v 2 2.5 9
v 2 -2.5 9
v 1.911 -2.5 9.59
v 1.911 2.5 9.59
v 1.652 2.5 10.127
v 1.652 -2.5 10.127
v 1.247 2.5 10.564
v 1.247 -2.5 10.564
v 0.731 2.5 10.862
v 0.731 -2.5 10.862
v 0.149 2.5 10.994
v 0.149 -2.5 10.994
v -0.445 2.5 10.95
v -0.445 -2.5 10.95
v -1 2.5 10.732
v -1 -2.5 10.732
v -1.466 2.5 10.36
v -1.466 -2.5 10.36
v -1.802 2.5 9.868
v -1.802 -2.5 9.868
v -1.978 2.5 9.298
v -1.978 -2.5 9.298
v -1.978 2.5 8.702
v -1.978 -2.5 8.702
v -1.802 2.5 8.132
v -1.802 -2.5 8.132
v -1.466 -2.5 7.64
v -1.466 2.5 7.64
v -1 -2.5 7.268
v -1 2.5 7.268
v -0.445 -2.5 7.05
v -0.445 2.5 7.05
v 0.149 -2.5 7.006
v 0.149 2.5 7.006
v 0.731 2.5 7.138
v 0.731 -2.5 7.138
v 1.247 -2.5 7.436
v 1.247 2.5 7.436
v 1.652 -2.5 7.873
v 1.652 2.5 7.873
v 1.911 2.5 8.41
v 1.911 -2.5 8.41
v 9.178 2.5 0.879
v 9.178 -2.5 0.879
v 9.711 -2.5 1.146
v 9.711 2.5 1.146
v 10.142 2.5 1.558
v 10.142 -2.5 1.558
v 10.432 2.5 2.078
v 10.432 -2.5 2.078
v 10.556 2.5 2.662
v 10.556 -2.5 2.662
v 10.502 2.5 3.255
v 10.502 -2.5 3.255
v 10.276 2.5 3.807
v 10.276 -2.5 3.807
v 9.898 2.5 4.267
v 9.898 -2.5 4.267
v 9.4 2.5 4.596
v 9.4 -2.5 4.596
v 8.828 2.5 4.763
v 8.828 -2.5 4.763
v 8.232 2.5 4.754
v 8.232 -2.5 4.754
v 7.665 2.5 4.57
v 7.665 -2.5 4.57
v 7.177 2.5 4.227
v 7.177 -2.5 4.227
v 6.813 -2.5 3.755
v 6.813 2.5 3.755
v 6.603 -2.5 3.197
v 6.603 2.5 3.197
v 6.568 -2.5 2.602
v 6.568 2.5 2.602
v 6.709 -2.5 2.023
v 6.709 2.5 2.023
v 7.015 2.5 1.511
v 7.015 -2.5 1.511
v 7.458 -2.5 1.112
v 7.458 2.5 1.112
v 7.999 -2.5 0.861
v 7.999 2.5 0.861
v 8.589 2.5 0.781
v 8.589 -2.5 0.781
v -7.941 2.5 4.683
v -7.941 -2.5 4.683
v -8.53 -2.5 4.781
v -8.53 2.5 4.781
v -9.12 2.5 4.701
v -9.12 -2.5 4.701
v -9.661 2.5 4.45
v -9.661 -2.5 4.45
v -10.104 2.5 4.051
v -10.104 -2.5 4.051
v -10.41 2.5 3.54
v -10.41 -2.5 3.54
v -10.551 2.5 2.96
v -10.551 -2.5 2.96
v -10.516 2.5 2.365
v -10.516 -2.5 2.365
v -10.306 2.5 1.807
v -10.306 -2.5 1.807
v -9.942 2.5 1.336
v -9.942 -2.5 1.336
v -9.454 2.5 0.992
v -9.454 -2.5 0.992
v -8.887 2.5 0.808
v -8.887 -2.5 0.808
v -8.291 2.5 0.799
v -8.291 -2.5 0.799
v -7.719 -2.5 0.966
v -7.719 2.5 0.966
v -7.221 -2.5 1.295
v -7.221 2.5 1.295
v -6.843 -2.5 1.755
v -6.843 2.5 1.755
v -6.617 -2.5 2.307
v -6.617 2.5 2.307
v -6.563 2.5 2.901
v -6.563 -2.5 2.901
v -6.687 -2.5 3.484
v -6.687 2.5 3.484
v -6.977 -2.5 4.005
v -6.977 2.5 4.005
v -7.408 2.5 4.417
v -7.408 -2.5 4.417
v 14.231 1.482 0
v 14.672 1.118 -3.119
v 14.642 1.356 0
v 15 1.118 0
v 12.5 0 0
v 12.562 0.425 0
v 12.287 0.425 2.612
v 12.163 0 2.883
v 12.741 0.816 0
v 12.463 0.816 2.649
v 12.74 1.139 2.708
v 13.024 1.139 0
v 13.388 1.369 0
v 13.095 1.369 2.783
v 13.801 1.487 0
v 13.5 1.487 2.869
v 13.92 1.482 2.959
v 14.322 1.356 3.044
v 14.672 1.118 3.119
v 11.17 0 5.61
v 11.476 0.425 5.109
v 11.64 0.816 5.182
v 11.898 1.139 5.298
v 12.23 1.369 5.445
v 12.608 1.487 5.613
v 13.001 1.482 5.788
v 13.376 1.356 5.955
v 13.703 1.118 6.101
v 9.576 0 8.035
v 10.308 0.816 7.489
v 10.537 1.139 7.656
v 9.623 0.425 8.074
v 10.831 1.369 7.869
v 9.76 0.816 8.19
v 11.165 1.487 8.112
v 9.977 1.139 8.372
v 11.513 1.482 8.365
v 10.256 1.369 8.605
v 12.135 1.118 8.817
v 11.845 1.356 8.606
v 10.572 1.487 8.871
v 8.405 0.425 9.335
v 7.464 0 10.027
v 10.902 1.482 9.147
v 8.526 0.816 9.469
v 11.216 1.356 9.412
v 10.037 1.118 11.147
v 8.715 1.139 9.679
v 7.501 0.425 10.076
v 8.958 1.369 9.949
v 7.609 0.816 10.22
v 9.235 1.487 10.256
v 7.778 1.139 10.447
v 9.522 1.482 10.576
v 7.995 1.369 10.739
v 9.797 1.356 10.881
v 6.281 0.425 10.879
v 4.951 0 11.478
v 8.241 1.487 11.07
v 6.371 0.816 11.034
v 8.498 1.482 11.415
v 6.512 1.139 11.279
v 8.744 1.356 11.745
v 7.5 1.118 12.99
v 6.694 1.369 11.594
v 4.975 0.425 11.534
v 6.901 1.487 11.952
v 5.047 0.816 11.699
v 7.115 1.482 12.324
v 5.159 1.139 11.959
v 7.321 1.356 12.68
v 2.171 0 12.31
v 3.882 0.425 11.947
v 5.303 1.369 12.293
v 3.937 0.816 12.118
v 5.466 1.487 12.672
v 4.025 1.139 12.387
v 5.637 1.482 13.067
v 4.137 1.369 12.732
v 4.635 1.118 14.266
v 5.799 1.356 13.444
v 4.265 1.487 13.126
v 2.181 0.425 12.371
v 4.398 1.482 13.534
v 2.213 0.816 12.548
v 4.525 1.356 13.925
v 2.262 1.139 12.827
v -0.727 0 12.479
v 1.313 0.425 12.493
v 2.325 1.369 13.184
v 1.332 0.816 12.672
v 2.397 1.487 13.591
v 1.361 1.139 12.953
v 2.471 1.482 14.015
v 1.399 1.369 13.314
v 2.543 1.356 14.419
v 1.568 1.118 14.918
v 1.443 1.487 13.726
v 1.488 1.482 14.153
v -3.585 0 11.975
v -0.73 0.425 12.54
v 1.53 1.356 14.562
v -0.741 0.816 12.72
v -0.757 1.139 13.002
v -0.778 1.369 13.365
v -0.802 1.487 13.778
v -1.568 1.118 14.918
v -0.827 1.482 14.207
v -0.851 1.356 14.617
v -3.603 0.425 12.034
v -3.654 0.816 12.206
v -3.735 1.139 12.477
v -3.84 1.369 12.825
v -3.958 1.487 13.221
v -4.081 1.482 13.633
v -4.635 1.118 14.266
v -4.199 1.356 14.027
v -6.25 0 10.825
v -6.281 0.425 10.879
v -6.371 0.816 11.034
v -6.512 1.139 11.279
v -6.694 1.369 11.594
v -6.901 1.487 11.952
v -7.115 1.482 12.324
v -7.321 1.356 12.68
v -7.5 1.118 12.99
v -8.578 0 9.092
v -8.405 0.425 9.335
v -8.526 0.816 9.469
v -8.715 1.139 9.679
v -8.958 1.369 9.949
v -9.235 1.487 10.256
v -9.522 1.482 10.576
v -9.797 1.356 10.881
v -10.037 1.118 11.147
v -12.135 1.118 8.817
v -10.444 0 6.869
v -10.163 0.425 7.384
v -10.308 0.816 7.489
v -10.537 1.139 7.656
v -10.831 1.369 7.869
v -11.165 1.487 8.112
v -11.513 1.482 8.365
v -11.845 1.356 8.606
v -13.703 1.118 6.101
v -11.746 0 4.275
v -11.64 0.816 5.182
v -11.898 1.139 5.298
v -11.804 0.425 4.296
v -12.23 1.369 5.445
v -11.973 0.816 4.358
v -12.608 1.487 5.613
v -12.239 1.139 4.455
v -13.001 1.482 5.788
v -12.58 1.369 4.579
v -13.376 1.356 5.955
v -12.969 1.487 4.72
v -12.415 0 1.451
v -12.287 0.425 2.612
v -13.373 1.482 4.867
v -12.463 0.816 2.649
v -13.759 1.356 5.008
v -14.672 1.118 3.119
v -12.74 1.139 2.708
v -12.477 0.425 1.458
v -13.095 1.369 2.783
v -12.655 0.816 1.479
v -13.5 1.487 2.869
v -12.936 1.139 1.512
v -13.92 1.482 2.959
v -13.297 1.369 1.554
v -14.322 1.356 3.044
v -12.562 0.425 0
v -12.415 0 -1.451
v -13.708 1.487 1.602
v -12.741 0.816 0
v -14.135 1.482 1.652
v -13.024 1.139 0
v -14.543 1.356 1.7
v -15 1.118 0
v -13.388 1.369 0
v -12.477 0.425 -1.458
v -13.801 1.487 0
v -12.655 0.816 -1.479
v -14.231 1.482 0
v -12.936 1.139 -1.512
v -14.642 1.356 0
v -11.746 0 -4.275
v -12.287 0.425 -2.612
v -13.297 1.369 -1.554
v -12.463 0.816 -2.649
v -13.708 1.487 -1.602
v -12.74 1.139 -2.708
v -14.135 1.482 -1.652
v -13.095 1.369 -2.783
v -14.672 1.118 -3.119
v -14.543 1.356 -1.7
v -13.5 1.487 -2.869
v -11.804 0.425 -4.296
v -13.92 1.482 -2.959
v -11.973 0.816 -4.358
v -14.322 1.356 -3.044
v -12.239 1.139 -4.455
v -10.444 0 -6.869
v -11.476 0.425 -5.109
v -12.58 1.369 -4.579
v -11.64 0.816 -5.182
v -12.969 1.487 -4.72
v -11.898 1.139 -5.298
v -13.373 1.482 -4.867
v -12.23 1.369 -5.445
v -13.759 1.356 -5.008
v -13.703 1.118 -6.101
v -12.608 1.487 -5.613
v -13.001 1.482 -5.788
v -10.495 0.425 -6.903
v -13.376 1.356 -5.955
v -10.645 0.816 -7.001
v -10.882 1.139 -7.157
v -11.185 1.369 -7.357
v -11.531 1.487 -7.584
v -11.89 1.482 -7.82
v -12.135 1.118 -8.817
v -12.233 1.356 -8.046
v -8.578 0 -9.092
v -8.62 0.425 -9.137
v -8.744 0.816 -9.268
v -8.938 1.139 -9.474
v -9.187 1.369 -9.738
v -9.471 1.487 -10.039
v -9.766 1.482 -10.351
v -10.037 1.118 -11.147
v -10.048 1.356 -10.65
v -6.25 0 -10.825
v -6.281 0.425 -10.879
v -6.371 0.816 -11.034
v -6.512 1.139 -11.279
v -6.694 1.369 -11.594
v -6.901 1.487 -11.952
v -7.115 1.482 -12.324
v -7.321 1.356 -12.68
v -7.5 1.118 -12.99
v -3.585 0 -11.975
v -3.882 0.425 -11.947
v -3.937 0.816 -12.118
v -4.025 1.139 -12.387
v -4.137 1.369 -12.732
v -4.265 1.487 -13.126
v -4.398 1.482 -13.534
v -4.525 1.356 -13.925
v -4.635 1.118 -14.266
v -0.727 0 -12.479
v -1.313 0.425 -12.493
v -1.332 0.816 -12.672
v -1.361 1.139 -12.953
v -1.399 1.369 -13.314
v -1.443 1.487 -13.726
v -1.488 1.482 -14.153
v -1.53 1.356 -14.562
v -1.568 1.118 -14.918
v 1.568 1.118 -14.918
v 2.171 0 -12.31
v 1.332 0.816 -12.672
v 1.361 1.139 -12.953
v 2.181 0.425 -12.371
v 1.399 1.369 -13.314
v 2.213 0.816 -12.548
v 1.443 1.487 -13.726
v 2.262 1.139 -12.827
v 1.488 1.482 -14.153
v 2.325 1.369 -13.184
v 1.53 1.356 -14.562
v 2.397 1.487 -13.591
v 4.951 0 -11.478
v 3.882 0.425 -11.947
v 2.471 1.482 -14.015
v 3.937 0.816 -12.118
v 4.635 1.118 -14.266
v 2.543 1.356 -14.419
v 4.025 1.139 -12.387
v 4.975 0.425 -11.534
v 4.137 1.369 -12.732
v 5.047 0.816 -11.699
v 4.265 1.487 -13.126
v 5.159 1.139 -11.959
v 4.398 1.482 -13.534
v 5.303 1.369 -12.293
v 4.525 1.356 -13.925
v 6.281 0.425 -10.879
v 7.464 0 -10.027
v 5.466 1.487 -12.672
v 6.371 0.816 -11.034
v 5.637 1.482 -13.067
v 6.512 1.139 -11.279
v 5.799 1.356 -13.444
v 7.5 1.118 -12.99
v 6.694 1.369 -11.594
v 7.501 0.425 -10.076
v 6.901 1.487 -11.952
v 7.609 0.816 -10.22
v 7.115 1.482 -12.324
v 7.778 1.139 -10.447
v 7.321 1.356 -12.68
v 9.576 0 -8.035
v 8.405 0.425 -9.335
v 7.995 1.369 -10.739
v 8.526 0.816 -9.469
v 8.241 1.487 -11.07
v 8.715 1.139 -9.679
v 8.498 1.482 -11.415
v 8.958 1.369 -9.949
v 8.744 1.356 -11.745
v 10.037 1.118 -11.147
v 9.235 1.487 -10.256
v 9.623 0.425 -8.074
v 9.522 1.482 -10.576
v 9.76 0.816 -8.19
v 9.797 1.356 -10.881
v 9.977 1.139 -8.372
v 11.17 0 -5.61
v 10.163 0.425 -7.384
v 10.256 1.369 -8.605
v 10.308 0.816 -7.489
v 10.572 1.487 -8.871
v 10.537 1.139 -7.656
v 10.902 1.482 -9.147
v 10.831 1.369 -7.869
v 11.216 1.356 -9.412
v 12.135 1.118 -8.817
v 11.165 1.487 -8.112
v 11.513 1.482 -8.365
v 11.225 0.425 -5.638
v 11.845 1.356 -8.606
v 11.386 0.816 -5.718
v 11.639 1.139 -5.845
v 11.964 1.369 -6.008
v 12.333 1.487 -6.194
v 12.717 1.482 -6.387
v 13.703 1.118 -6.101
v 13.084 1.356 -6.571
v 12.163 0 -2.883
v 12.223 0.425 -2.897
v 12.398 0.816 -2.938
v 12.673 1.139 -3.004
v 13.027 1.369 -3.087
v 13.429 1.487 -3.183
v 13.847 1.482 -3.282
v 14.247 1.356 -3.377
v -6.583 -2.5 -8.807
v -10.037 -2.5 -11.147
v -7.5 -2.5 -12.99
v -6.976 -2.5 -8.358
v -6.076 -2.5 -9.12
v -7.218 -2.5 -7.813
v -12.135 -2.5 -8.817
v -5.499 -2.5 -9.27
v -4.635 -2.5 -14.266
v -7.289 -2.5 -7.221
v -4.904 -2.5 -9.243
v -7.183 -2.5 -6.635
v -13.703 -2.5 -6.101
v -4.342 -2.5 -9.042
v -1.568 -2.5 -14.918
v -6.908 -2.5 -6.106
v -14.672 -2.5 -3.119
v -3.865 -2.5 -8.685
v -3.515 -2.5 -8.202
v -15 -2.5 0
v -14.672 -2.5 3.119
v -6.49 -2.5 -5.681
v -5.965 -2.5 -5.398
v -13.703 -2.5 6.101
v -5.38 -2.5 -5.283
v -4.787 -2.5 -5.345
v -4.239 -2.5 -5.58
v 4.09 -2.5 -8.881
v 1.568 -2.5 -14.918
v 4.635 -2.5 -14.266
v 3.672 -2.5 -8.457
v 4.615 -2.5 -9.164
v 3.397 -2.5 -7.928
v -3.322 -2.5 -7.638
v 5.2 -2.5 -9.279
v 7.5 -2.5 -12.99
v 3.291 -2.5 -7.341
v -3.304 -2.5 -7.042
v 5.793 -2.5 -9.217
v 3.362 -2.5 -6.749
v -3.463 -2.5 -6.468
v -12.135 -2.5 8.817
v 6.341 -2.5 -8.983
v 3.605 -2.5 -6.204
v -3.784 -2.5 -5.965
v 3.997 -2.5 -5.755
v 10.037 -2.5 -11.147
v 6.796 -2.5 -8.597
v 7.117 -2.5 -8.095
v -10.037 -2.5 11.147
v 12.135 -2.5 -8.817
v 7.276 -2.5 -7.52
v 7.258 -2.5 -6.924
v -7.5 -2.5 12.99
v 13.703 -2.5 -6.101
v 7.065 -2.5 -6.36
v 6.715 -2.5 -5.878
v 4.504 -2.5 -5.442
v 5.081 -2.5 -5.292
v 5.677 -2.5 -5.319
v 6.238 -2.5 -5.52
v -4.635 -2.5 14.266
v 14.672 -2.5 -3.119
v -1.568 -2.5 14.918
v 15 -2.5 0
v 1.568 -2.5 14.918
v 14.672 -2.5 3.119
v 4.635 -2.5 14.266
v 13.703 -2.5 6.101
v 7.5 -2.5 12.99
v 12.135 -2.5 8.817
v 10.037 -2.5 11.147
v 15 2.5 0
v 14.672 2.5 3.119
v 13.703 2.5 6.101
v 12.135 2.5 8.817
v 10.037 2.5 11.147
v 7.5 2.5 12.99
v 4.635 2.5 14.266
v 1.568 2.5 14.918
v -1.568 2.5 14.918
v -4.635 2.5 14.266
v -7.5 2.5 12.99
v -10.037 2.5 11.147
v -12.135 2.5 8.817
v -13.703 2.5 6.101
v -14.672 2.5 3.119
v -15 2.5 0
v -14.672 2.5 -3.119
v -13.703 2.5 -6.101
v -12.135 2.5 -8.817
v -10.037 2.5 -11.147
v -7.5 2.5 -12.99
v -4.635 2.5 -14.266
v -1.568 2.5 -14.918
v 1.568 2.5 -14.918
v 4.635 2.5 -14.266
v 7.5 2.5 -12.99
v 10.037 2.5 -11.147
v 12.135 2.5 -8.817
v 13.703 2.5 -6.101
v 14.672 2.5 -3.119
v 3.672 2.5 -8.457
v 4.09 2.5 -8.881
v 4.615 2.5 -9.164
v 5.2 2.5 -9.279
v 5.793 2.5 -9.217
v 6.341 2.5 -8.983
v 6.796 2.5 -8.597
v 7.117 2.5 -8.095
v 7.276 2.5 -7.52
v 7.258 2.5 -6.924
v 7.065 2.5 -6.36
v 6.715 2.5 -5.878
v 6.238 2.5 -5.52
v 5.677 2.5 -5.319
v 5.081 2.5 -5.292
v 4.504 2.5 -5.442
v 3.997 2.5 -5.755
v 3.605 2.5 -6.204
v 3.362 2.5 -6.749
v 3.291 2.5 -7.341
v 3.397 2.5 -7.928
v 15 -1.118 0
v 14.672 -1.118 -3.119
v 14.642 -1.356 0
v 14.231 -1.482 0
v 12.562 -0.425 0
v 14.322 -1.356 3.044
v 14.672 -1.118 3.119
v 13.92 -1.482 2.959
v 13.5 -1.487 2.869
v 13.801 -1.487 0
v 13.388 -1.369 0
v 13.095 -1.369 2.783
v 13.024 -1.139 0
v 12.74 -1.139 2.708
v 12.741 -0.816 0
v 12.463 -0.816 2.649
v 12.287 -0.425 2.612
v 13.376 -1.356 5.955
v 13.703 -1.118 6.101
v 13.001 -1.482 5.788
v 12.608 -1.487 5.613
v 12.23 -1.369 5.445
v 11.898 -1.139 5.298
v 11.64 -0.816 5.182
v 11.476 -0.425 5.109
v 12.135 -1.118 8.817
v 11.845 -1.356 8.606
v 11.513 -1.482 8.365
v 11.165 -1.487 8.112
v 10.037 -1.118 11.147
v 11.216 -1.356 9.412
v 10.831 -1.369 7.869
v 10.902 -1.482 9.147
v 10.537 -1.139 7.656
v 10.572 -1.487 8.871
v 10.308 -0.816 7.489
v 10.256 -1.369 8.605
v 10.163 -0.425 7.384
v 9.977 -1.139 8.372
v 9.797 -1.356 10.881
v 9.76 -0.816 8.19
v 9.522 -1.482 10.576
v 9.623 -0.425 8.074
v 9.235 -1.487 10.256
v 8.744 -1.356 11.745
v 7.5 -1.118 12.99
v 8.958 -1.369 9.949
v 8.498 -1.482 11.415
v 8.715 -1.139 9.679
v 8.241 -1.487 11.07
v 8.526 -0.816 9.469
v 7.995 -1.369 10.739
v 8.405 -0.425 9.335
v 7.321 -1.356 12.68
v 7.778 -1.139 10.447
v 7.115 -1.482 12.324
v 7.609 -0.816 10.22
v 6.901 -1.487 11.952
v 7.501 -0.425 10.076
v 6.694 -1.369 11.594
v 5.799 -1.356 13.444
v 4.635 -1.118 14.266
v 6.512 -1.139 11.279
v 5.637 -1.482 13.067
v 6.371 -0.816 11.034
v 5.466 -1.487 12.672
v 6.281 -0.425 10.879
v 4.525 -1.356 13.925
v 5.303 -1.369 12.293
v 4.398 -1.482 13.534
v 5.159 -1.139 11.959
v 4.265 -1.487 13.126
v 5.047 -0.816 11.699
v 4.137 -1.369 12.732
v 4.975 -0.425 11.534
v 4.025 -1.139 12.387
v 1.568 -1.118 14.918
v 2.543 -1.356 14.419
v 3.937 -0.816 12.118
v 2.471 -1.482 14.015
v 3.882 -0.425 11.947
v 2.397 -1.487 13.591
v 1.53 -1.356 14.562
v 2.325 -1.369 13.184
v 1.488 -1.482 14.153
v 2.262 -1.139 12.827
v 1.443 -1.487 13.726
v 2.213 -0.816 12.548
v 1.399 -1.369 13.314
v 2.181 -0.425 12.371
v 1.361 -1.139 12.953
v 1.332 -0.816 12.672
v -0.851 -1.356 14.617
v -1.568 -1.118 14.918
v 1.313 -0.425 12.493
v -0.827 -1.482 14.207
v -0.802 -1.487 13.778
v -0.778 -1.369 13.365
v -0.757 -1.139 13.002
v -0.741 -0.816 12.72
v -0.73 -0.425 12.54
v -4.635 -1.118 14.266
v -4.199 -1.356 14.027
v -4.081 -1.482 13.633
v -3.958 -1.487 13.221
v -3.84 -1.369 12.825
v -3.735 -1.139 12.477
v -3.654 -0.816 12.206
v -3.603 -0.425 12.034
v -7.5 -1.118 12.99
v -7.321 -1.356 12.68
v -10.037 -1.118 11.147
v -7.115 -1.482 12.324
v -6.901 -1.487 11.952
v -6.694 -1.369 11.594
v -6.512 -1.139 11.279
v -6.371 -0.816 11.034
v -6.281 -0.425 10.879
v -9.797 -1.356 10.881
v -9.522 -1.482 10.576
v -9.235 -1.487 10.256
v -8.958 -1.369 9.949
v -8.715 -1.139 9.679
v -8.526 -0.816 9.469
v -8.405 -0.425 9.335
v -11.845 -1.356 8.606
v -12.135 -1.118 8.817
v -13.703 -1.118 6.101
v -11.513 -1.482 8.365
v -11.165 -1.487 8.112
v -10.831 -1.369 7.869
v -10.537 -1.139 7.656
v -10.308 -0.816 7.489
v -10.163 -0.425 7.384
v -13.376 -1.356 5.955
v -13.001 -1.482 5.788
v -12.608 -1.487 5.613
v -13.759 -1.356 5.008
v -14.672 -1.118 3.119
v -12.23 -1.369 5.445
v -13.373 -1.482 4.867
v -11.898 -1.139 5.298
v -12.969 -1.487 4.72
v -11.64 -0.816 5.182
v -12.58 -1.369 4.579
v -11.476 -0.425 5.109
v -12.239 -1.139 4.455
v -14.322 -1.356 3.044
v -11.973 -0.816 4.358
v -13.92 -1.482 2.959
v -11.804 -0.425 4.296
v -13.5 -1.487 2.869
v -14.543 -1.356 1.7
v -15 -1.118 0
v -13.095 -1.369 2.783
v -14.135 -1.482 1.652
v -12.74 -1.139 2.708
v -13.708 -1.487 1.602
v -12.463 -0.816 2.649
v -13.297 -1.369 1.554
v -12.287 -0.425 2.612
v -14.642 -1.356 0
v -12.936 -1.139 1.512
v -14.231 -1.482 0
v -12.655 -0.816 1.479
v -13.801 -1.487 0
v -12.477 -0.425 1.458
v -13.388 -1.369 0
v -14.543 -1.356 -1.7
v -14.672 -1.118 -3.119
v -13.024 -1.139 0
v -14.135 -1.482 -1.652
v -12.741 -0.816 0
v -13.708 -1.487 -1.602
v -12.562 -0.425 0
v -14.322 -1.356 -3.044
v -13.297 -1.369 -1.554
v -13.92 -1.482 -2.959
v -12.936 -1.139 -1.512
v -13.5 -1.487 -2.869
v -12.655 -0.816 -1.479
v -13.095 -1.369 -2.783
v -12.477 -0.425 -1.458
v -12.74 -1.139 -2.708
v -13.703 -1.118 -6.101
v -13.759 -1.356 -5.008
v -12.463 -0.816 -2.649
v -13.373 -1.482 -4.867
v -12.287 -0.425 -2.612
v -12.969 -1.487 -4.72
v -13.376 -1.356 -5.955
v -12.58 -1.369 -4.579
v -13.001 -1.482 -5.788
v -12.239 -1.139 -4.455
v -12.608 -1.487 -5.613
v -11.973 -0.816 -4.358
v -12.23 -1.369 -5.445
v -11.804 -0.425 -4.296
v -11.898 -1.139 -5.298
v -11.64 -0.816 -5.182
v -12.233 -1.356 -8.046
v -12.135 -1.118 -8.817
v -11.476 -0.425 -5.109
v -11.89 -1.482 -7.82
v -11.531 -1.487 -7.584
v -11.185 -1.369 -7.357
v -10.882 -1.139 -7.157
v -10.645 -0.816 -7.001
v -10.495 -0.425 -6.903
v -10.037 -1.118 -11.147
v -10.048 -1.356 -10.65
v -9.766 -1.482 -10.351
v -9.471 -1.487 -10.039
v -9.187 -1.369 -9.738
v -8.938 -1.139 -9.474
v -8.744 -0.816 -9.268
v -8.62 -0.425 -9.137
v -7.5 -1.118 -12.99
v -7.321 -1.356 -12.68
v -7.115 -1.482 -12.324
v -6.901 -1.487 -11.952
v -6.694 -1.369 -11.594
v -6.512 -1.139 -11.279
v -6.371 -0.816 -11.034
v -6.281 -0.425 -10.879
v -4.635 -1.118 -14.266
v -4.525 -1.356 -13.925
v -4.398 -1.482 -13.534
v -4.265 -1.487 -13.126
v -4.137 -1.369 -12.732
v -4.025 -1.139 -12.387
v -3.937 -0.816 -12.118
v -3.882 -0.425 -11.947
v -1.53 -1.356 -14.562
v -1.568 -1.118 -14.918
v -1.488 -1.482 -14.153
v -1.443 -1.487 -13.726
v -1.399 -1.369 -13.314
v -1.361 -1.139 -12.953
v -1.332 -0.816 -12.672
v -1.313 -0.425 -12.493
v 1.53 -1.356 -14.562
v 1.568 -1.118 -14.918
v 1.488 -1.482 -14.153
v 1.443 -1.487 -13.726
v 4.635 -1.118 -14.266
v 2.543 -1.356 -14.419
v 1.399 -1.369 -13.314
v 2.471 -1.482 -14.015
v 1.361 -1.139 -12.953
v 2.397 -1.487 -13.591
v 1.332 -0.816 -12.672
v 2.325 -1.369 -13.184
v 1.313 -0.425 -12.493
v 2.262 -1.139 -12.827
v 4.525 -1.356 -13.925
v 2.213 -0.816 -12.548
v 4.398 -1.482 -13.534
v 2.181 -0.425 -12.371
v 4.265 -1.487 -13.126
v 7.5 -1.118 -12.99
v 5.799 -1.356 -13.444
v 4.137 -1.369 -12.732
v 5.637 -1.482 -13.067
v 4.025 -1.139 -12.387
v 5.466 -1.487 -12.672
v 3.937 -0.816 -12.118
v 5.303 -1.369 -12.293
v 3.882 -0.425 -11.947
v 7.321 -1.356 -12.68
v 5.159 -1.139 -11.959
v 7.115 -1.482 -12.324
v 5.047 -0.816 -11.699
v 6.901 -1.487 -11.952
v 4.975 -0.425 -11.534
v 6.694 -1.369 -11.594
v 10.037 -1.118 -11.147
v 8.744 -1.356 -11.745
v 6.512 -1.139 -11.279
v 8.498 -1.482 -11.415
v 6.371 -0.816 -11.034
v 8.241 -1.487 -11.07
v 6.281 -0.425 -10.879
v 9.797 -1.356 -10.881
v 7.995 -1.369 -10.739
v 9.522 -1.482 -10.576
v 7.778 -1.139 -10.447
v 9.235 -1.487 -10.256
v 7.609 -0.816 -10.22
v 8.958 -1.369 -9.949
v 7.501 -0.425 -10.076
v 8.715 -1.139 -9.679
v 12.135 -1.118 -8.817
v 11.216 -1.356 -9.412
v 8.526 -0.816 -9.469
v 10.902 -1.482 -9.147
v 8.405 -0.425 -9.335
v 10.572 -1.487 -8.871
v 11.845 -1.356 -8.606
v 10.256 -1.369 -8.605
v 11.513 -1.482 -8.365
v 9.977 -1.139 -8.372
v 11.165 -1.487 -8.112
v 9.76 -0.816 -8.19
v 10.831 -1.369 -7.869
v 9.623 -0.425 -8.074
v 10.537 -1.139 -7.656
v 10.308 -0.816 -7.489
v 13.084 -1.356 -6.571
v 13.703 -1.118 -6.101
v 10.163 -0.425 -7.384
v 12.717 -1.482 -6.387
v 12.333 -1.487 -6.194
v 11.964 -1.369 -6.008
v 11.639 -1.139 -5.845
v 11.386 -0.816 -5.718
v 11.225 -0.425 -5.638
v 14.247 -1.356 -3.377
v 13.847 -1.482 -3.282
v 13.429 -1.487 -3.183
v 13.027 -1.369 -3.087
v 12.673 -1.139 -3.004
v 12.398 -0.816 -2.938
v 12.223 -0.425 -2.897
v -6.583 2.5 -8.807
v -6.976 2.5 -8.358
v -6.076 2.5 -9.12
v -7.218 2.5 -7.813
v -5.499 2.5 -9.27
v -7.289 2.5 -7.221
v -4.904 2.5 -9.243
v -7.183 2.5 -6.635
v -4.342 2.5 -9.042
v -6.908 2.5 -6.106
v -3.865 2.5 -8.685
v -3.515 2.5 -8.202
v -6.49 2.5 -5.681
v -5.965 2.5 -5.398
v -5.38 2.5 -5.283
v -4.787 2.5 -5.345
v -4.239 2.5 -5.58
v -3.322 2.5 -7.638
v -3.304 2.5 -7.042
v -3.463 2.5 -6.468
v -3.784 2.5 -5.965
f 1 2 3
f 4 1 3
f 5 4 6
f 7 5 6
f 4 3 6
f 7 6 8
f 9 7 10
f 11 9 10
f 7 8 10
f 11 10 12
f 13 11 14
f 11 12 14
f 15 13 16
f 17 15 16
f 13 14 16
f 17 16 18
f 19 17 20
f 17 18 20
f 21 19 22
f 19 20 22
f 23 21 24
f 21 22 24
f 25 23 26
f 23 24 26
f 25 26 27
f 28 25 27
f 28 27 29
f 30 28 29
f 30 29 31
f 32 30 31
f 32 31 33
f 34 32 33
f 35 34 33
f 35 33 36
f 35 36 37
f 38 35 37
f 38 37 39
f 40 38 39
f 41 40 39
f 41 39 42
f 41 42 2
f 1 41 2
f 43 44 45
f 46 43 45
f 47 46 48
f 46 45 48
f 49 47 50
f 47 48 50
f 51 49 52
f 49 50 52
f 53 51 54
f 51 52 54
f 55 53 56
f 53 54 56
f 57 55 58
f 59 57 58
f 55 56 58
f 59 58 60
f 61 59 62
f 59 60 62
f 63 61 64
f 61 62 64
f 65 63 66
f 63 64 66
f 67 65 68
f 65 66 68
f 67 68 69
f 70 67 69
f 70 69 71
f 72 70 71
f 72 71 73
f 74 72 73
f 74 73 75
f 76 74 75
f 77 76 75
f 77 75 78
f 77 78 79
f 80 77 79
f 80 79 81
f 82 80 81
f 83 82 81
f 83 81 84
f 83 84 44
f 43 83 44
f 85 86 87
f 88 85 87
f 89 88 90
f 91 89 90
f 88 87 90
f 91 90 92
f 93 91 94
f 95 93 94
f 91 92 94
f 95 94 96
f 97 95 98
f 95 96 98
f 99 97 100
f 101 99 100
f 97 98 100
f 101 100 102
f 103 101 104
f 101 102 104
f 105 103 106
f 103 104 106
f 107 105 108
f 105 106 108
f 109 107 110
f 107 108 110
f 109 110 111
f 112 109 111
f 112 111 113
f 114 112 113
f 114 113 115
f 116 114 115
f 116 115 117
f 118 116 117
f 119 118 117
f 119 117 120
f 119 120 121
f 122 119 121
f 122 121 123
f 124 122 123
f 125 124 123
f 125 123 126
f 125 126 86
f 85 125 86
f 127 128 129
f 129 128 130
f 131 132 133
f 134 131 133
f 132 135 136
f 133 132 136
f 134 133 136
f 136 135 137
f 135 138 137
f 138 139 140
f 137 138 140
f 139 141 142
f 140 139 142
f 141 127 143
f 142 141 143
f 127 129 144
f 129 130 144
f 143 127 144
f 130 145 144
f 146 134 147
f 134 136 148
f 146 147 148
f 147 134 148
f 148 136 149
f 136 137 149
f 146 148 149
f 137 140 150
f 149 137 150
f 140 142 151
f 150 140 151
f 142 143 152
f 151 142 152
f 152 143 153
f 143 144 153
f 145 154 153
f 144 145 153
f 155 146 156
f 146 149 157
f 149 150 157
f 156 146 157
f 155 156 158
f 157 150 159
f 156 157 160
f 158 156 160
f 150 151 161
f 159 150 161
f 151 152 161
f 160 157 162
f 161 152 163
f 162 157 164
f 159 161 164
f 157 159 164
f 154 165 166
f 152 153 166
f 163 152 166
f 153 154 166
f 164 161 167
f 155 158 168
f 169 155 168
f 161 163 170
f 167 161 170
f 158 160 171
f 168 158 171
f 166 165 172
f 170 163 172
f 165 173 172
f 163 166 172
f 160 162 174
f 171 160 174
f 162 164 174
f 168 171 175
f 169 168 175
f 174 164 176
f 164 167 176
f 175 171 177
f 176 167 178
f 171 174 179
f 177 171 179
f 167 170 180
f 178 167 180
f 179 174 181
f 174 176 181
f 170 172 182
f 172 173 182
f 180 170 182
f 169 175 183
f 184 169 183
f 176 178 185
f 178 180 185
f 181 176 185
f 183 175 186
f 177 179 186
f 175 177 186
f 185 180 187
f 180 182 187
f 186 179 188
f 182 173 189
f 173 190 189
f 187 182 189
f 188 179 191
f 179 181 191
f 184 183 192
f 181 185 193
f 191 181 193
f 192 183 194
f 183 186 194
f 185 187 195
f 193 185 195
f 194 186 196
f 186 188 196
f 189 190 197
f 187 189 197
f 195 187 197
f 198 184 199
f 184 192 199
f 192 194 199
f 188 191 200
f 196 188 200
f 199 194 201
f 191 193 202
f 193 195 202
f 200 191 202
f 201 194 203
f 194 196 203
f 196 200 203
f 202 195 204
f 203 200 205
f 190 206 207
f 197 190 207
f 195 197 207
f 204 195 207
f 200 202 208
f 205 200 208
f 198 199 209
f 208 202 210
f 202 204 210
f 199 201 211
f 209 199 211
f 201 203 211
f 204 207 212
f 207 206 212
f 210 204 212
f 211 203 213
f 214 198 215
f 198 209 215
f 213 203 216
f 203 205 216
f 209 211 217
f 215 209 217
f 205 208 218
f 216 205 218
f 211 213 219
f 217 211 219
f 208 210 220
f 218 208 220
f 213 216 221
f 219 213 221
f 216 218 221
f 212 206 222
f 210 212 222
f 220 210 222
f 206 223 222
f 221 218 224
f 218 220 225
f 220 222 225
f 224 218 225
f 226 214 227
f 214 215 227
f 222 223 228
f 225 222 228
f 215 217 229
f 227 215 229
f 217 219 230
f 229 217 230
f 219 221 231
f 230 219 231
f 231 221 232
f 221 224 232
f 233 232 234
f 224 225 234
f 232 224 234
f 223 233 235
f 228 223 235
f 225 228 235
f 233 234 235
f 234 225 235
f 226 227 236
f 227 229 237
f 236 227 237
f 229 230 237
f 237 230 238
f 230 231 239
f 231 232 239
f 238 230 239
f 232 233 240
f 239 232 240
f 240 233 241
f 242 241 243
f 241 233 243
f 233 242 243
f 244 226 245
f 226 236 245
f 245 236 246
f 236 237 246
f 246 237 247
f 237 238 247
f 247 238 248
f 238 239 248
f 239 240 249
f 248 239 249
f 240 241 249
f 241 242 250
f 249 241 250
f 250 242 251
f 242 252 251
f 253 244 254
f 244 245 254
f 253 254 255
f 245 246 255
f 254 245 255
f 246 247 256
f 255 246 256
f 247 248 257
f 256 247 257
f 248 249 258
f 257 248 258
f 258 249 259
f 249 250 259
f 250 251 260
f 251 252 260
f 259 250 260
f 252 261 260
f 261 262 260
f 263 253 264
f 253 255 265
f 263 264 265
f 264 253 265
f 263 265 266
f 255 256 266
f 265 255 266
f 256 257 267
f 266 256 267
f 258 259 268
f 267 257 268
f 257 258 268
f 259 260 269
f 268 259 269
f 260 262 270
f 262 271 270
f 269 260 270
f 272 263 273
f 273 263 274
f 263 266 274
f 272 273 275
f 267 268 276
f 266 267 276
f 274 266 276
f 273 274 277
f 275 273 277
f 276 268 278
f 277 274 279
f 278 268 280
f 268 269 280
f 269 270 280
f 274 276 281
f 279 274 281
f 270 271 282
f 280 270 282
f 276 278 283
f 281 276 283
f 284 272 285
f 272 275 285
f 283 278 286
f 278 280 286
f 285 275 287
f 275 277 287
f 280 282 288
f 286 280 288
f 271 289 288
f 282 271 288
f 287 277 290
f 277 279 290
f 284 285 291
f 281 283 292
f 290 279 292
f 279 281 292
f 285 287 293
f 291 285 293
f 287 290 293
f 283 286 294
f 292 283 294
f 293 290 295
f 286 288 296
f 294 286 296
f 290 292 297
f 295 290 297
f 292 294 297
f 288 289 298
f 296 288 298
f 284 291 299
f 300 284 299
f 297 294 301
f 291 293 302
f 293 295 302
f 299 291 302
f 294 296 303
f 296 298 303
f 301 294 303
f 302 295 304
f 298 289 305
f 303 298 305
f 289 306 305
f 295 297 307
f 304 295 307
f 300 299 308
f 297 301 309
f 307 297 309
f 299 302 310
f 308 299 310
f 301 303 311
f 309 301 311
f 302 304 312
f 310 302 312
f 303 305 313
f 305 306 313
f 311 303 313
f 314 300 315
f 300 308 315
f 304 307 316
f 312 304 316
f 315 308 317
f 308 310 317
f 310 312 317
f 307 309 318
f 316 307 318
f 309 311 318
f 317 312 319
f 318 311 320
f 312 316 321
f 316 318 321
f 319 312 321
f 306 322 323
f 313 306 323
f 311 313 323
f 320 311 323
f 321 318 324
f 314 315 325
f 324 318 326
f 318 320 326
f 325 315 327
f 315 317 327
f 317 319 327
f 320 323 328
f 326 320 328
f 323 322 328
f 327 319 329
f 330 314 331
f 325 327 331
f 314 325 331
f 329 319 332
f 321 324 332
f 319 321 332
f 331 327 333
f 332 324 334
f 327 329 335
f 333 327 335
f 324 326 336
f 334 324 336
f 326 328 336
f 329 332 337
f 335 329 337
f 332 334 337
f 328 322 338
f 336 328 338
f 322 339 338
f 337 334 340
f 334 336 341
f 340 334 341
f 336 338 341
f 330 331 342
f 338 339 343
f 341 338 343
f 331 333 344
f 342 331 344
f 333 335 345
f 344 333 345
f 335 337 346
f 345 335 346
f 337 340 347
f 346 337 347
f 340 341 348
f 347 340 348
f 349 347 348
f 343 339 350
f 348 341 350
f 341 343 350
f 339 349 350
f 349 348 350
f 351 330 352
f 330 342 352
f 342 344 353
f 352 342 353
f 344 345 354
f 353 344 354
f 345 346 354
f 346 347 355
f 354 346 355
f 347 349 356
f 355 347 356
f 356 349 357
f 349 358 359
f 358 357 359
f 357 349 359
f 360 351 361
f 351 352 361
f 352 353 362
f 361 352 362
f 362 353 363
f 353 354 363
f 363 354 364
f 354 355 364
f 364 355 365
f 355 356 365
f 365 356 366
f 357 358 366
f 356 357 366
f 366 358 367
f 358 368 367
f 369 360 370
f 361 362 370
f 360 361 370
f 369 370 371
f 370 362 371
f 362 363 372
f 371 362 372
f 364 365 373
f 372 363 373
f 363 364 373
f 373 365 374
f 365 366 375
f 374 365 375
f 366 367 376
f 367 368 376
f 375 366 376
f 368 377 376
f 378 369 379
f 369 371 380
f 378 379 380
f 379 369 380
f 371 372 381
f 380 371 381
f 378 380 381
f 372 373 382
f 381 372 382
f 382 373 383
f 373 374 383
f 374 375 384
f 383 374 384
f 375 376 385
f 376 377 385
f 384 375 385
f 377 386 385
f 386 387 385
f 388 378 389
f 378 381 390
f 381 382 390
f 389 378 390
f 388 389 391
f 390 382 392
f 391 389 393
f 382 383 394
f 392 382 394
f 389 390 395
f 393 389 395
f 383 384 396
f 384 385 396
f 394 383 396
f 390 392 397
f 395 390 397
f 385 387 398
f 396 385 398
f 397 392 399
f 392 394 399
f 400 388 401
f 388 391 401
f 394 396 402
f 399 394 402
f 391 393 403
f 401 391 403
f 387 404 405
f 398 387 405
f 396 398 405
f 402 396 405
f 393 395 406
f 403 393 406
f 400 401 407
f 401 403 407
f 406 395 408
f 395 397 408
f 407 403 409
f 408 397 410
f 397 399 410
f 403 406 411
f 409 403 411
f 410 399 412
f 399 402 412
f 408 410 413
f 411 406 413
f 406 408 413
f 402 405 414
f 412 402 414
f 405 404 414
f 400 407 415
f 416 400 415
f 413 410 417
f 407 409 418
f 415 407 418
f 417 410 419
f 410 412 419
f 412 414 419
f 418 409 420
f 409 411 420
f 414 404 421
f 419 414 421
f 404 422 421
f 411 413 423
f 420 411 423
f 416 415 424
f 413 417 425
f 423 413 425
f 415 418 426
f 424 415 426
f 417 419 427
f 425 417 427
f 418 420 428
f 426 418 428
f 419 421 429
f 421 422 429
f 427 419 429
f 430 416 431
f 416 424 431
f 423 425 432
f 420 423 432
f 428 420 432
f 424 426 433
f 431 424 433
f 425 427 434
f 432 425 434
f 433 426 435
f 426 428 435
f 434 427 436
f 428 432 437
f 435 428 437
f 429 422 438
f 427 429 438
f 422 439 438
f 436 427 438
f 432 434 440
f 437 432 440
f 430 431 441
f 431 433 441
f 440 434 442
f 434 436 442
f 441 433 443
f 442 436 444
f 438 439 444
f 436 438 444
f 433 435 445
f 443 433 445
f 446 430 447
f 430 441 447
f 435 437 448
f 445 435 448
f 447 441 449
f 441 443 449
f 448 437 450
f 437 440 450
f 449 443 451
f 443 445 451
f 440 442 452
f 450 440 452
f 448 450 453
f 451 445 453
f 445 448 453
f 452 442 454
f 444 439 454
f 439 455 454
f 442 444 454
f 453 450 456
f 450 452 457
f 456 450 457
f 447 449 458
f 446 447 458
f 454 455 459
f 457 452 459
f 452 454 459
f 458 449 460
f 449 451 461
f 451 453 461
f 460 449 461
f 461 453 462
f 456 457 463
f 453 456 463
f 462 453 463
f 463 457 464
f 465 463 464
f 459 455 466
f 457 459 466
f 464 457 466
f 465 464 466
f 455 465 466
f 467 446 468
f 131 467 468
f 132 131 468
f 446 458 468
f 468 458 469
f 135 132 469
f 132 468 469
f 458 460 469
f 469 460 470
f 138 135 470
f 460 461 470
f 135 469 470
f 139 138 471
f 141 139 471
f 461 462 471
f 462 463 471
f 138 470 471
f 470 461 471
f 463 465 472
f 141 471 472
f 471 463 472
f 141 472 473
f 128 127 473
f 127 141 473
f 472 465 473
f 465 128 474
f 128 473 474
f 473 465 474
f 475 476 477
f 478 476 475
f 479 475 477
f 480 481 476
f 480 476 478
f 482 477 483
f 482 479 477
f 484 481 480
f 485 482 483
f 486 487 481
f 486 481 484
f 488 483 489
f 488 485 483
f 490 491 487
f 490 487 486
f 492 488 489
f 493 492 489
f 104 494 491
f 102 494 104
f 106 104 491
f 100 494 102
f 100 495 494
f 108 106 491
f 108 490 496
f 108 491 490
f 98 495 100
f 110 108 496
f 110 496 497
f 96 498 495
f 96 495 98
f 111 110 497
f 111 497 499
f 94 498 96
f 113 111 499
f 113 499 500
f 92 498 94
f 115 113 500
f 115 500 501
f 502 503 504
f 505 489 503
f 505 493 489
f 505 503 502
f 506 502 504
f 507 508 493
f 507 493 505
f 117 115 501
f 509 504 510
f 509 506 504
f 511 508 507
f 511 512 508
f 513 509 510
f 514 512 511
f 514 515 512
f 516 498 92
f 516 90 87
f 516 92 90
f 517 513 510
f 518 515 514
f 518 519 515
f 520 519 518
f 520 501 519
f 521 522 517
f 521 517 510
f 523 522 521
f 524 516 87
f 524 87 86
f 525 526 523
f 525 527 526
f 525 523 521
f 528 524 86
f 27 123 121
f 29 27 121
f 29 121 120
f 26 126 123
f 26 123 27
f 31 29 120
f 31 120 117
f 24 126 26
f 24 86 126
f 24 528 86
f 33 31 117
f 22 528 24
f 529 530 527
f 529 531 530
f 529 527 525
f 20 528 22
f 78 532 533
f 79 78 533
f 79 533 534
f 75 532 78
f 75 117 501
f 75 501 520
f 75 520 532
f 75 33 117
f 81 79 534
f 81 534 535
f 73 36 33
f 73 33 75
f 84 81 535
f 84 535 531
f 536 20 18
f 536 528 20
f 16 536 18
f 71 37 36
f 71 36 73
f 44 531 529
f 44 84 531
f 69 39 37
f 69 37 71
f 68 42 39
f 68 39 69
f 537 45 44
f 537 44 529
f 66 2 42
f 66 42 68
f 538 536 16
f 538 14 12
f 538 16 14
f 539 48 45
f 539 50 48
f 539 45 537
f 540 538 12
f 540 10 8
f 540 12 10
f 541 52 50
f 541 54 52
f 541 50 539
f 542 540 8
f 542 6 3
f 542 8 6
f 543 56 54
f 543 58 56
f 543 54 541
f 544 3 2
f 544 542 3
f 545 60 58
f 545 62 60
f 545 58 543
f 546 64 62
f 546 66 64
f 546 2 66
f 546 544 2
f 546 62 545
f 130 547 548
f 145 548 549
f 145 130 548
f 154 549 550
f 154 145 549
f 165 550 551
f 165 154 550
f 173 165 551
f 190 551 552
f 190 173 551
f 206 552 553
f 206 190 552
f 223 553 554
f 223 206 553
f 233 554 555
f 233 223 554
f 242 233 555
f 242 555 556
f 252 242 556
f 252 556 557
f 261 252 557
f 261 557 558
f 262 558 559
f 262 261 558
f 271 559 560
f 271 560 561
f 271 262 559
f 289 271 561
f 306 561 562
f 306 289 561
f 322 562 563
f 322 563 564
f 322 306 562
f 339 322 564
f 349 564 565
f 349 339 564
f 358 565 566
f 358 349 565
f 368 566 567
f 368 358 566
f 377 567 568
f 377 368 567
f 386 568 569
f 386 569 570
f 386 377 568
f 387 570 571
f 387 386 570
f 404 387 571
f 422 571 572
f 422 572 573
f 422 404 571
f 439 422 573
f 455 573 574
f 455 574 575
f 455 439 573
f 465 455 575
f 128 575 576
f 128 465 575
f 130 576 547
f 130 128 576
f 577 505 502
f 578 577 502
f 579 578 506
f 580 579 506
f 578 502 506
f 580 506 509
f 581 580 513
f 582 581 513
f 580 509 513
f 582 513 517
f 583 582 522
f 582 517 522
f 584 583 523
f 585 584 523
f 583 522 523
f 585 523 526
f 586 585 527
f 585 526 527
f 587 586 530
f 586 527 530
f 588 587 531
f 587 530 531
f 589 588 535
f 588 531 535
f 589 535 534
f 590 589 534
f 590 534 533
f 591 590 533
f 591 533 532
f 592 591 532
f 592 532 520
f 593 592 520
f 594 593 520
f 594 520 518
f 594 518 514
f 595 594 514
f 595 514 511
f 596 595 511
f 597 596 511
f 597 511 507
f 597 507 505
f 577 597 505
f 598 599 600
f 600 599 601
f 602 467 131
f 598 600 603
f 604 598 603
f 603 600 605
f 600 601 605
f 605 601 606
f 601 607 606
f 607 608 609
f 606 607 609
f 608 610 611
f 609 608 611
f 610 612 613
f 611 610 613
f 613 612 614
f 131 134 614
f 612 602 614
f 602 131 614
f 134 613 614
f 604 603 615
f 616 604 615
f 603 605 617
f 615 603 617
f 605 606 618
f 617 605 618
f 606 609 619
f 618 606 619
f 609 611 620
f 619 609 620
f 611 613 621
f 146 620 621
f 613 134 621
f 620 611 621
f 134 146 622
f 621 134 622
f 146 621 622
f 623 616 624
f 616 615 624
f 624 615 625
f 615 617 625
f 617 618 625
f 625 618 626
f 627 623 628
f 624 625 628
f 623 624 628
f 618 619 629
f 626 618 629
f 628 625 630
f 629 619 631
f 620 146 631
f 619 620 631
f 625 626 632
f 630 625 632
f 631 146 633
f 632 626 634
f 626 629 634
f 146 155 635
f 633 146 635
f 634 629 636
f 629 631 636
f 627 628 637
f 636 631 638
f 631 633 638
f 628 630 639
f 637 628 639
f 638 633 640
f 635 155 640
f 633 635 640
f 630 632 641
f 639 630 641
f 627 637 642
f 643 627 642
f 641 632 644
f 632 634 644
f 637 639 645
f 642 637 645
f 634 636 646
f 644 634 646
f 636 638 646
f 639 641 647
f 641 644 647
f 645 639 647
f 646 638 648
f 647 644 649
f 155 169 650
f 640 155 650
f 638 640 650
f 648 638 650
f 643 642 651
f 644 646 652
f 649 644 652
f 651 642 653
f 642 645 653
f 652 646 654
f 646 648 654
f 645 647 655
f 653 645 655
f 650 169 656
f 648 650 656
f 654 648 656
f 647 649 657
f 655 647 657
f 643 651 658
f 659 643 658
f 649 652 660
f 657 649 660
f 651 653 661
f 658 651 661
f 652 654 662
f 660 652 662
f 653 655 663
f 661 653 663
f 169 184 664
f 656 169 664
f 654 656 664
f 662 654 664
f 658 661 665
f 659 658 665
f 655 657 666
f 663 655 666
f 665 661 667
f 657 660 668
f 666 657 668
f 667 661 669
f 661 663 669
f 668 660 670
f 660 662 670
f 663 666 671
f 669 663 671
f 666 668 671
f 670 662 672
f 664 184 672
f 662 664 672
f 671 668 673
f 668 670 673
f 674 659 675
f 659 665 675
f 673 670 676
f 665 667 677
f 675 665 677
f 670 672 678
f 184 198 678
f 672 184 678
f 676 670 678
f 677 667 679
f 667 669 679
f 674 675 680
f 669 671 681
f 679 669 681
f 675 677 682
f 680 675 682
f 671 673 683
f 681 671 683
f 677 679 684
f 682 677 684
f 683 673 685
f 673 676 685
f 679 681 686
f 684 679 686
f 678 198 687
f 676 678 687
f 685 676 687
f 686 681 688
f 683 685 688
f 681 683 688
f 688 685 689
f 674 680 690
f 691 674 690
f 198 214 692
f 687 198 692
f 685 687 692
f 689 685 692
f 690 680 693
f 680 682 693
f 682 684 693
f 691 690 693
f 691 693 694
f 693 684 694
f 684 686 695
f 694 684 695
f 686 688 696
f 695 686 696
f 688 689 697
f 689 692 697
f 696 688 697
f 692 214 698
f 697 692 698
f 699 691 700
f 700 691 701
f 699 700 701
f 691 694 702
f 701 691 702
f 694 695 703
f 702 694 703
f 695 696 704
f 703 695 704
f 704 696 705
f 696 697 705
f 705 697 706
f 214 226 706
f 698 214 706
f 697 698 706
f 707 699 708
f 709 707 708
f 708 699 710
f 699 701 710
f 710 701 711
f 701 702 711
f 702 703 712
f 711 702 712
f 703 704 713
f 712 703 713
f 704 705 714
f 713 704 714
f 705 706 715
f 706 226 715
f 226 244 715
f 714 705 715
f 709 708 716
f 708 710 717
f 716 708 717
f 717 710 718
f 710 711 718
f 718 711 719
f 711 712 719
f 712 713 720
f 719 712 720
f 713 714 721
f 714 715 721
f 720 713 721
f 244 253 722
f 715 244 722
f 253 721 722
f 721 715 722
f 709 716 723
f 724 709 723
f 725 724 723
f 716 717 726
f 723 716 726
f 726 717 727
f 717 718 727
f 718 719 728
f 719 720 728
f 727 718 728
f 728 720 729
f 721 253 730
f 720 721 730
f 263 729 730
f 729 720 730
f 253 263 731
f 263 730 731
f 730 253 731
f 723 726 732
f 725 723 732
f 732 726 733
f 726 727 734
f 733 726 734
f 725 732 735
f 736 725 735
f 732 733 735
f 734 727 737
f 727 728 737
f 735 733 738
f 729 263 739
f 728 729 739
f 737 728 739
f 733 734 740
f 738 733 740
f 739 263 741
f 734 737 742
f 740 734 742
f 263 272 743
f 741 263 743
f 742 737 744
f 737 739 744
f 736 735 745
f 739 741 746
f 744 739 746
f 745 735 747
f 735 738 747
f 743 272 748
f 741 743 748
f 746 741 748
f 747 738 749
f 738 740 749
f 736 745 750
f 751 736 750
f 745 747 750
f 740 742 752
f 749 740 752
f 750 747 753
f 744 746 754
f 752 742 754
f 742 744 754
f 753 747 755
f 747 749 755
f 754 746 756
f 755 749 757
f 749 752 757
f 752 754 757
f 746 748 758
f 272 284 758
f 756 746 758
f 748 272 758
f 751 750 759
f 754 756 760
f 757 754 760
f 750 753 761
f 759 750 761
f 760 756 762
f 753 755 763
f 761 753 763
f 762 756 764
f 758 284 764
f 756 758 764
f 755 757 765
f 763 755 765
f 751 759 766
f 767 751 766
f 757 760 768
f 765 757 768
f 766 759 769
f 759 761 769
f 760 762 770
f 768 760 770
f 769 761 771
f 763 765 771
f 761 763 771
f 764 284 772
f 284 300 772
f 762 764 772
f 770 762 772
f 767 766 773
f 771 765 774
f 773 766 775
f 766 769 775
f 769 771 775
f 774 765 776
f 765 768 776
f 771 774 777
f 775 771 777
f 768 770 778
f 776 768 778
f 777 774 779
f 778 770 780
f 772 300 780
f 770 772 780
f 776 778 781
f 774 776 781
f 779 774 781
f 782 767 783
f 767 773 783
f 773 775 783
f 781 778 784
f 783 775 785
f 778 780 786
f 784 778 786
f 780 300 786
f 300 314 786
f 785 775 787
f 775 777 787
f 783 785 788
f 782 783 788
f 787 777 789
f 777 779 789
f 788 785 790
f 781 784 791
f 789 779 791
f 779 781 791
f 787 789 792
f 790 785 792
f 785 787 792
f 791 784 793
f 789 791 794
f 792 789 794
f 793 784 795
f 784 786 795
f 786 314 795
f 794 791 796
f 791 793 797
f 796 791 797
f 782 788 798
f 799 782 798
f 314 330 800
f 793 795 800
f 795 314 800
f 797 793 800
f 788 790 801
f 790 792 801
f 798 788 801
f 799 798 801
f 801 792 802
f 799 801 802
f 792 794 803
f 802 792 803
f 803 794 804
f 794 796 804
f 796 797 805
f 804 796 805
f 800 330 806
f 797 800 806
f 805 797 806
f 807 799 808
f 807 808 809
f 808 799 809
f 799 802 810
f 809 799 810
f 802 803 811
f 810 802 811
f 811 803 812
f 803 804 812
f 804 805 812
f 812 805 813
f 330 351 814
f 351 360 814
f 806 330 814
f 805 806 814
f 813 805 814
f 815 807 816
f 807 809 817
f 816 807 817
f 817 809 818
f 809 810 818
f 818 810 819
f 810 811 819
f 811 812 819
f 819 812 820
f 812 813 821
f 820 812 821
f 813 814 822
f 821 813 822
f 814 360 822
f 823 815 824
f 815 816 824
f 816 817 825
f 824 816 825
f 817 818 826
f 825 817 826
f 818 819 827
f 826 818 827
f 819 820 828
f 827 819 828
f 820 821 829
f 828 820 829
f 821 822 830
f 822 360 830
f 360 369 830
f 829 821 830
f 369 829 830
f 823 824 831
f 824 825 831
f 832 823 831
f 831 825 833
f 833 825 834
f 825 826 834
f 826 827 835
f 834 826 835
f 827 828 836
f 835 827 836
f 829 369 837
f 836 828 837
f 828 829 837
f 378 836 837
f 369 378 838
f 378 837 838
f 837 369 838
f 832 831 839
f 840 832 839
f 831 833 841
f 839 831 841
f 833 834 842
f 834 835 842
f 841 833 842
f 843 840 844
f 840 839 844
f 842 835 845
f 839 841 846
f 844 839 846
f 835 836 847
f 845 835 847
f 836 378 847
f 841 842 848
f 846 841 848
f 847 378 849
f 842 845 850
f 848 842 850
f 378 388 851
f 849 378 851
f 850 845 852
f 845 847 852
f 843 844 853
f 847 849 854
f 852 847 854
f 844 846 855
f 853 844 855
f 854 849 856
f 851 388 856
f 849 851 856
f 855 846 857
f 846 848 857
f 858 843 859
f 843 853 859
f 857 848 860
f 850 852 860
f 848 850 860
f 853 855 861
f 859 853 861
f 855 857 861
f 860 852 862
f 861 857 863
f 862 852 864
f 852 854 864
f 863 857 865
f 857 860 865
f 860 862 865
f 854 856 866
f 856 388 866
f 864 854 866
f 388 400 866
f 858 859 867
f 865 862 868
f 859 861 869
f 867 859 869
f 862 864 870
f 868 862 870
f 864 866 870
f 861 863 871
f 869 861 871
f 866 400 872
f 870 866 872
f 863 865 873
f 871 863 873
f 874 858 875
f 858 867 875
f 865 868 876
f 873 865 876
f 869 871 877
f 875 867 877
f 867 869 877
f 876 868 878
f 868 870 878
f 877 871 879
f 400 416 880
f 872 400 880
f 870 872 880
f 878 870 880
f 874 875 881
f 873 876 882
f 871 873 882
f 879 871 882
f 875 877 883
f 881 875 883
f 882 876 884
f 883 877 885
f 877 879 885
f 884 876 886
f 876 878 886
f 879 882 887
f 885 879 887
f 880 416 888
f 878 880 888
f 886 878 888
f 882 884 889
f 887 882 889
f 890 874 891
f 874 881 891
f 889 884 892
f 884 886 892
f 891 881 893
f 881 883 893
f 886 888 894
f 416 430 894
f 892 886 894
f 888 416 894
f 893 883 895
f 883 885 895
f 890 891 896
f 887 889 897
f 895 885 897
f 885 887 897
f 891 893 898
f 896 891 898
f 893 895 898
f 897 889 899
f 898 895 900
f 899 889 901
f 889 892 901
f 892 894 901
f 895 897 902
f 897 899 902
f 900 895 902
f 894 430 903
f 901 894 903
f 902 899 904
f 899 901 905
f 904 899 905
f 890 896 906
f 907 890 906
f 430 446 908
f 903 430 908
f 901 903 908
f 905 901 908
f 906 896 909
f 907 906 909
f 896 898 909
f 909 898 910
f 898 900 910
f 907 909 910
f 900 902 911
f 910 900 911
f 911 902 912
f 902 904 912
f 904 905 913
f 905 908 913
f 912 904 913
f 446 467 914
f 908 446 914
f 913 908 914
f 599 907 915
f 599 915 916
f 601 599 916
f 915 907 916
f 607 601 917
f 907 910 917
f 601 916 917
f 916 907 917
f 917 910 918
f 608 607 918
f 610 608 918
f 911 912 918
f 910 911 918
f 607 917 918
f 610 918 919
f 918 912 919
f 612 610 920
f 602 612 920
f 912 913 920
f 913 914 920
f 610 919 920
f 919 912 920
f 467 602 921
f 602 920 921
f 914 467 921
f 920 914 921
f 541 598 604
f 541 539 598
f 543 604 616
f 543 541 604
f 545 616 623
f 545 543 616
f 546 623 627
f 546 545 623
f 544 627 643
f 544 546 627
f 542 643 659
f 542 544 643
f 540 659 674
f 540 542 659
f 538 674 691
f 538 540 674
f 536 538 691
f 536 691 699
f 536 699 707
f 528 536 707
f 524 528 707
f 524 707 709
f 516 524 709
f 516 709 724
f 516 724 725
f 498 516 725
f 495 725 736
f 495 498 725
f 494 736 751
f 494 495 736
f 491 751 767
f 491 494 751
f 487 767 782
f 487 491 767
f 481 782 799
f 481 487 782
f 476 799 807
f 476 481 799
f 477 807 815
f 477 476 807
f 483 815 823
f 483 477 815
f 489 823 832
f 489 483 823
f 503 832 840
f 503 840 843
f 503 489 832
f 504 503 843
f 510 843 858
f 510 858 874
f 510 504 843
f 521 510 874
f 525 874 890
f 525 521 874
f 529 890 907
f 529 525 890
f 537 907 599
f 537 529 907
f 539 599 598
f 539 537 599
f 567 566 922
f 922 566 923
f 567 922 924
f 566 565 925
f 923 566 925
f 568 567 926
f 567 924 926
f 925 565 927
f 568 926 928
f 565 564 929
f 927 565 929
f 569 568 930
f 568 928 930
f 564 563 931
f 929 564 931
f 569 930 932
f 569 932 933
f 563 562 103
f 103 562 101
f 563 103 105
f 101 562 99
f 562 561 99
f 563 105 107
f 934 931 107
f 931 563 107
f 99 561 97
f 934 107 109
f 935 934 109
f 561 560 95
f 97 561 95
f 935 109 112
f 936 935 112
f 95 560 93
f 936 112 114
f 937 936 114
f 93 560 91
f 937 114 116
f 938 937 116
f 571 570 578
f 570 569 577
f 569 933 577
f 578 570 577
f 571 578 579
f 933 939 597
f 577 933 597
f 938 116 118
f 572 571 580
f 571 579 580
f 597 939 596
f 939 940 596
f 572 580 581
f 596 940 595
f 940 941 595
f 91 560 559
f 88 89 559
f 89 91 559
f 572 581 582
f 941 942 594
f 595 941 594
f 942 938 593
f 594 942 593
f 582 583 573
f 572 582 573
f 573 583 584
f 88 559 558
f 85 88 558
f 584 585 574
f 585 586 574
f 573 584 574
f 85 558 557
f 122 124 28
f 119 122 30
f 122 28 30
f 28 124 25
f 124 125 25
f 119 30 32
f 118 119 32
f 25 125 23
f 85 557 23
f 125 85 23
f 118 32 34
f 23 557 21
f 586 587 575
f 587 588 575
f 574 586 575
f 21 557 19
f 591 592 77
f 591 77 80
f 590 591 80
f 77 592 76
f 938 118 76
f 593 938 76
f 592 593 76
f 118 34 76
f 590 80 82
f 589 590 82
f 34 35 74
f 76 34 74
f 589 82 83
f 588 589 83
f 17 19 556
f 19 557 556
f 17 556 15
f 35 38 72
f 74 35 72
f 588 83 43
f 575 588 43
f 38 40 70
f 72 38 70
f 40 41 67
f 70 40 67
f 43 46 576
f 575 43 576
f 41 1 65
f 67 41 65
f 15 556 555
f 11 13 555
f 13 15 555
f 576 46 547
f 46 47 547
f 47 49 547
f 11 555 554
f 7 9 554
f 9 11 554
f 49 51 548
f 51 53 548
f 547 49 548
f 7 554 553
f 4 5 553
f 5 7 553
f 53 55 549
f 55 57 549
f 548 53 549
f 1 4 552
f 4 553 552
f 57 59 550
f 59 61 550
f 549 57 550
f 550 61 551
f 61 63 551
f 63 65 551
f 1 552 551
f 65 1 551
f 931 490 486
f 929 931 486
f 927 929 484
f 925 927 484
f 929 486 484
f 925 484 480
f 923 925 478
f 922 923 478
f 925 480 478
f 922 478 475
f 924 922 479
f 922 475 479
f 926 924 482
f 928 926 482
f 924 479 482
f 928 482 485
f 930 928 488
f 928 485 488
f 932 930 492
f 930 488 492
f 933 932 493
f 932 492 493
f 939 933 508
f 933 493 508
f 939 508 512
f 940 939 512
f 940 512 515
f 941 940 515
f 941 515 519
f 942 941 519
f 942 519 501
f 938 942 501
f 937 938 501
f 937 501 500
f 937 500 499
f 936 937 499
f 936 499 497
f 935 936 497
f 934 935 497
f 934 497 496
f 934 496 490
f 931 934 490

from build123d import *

# Parameters (mm, degrees)
SKETCH003_R        = 1.5
SKETCH_R           = 15
PAD_DEPTH          = 2.5
SKETCH005_R        = 2
POCKET001_DEPTH    = 90.441037
POLARPATTERN_COUNT = 5


with BuildPart() as body001:
    # AdditivePipe: sweep along a path in Sketch002
    with BuildLine(Plane.XZ) as additivepipe_path:
        CenterArc((0, 0), 9, 0, 360)
    # Sketch003 → AdditivePipe (sweep)
    with BuildSketch(Plane.XY):
        with Locations((-14, 0)):
            Circle(SKETCH003_R)
    sweep(path=additivepipe_path.line)


with BuildPart() as cut:
    # Sketch → Pad (new body, symmetric)
    with BuildSketch(Plane.XZ):
        Circle(SKETCH_R)
    extrude(amount=PAD_DEPTH, both=True)

    # Sketch005 → Pocket001 (cut, through all)
    with BuildSketch(Plane.XZ.offset(2.5)):
        with Locations((0, 9)):
            Circle(SKETCH005_R)
    pocket001 = extrude(amount=-POCKET001_DEPTH, mode=Mode.SUBTRACT)

    # PolarPattern: Pocket001 ×5 about axis
    polarpattern_axis = Axis((0, -2.5, 0), (0, -1, 0))
    for i in range(1, POLARPATTERN_COUNT):
        add(pocket001.rotate(polarpattern_axis, i * 360 / POLARPATTERN_COUNT), mode=Mode.SUBTRACT)

    # Cut: cut Body001
    add(body001.part, mode=Mode.SUBTRACT)


solid = cut.part
